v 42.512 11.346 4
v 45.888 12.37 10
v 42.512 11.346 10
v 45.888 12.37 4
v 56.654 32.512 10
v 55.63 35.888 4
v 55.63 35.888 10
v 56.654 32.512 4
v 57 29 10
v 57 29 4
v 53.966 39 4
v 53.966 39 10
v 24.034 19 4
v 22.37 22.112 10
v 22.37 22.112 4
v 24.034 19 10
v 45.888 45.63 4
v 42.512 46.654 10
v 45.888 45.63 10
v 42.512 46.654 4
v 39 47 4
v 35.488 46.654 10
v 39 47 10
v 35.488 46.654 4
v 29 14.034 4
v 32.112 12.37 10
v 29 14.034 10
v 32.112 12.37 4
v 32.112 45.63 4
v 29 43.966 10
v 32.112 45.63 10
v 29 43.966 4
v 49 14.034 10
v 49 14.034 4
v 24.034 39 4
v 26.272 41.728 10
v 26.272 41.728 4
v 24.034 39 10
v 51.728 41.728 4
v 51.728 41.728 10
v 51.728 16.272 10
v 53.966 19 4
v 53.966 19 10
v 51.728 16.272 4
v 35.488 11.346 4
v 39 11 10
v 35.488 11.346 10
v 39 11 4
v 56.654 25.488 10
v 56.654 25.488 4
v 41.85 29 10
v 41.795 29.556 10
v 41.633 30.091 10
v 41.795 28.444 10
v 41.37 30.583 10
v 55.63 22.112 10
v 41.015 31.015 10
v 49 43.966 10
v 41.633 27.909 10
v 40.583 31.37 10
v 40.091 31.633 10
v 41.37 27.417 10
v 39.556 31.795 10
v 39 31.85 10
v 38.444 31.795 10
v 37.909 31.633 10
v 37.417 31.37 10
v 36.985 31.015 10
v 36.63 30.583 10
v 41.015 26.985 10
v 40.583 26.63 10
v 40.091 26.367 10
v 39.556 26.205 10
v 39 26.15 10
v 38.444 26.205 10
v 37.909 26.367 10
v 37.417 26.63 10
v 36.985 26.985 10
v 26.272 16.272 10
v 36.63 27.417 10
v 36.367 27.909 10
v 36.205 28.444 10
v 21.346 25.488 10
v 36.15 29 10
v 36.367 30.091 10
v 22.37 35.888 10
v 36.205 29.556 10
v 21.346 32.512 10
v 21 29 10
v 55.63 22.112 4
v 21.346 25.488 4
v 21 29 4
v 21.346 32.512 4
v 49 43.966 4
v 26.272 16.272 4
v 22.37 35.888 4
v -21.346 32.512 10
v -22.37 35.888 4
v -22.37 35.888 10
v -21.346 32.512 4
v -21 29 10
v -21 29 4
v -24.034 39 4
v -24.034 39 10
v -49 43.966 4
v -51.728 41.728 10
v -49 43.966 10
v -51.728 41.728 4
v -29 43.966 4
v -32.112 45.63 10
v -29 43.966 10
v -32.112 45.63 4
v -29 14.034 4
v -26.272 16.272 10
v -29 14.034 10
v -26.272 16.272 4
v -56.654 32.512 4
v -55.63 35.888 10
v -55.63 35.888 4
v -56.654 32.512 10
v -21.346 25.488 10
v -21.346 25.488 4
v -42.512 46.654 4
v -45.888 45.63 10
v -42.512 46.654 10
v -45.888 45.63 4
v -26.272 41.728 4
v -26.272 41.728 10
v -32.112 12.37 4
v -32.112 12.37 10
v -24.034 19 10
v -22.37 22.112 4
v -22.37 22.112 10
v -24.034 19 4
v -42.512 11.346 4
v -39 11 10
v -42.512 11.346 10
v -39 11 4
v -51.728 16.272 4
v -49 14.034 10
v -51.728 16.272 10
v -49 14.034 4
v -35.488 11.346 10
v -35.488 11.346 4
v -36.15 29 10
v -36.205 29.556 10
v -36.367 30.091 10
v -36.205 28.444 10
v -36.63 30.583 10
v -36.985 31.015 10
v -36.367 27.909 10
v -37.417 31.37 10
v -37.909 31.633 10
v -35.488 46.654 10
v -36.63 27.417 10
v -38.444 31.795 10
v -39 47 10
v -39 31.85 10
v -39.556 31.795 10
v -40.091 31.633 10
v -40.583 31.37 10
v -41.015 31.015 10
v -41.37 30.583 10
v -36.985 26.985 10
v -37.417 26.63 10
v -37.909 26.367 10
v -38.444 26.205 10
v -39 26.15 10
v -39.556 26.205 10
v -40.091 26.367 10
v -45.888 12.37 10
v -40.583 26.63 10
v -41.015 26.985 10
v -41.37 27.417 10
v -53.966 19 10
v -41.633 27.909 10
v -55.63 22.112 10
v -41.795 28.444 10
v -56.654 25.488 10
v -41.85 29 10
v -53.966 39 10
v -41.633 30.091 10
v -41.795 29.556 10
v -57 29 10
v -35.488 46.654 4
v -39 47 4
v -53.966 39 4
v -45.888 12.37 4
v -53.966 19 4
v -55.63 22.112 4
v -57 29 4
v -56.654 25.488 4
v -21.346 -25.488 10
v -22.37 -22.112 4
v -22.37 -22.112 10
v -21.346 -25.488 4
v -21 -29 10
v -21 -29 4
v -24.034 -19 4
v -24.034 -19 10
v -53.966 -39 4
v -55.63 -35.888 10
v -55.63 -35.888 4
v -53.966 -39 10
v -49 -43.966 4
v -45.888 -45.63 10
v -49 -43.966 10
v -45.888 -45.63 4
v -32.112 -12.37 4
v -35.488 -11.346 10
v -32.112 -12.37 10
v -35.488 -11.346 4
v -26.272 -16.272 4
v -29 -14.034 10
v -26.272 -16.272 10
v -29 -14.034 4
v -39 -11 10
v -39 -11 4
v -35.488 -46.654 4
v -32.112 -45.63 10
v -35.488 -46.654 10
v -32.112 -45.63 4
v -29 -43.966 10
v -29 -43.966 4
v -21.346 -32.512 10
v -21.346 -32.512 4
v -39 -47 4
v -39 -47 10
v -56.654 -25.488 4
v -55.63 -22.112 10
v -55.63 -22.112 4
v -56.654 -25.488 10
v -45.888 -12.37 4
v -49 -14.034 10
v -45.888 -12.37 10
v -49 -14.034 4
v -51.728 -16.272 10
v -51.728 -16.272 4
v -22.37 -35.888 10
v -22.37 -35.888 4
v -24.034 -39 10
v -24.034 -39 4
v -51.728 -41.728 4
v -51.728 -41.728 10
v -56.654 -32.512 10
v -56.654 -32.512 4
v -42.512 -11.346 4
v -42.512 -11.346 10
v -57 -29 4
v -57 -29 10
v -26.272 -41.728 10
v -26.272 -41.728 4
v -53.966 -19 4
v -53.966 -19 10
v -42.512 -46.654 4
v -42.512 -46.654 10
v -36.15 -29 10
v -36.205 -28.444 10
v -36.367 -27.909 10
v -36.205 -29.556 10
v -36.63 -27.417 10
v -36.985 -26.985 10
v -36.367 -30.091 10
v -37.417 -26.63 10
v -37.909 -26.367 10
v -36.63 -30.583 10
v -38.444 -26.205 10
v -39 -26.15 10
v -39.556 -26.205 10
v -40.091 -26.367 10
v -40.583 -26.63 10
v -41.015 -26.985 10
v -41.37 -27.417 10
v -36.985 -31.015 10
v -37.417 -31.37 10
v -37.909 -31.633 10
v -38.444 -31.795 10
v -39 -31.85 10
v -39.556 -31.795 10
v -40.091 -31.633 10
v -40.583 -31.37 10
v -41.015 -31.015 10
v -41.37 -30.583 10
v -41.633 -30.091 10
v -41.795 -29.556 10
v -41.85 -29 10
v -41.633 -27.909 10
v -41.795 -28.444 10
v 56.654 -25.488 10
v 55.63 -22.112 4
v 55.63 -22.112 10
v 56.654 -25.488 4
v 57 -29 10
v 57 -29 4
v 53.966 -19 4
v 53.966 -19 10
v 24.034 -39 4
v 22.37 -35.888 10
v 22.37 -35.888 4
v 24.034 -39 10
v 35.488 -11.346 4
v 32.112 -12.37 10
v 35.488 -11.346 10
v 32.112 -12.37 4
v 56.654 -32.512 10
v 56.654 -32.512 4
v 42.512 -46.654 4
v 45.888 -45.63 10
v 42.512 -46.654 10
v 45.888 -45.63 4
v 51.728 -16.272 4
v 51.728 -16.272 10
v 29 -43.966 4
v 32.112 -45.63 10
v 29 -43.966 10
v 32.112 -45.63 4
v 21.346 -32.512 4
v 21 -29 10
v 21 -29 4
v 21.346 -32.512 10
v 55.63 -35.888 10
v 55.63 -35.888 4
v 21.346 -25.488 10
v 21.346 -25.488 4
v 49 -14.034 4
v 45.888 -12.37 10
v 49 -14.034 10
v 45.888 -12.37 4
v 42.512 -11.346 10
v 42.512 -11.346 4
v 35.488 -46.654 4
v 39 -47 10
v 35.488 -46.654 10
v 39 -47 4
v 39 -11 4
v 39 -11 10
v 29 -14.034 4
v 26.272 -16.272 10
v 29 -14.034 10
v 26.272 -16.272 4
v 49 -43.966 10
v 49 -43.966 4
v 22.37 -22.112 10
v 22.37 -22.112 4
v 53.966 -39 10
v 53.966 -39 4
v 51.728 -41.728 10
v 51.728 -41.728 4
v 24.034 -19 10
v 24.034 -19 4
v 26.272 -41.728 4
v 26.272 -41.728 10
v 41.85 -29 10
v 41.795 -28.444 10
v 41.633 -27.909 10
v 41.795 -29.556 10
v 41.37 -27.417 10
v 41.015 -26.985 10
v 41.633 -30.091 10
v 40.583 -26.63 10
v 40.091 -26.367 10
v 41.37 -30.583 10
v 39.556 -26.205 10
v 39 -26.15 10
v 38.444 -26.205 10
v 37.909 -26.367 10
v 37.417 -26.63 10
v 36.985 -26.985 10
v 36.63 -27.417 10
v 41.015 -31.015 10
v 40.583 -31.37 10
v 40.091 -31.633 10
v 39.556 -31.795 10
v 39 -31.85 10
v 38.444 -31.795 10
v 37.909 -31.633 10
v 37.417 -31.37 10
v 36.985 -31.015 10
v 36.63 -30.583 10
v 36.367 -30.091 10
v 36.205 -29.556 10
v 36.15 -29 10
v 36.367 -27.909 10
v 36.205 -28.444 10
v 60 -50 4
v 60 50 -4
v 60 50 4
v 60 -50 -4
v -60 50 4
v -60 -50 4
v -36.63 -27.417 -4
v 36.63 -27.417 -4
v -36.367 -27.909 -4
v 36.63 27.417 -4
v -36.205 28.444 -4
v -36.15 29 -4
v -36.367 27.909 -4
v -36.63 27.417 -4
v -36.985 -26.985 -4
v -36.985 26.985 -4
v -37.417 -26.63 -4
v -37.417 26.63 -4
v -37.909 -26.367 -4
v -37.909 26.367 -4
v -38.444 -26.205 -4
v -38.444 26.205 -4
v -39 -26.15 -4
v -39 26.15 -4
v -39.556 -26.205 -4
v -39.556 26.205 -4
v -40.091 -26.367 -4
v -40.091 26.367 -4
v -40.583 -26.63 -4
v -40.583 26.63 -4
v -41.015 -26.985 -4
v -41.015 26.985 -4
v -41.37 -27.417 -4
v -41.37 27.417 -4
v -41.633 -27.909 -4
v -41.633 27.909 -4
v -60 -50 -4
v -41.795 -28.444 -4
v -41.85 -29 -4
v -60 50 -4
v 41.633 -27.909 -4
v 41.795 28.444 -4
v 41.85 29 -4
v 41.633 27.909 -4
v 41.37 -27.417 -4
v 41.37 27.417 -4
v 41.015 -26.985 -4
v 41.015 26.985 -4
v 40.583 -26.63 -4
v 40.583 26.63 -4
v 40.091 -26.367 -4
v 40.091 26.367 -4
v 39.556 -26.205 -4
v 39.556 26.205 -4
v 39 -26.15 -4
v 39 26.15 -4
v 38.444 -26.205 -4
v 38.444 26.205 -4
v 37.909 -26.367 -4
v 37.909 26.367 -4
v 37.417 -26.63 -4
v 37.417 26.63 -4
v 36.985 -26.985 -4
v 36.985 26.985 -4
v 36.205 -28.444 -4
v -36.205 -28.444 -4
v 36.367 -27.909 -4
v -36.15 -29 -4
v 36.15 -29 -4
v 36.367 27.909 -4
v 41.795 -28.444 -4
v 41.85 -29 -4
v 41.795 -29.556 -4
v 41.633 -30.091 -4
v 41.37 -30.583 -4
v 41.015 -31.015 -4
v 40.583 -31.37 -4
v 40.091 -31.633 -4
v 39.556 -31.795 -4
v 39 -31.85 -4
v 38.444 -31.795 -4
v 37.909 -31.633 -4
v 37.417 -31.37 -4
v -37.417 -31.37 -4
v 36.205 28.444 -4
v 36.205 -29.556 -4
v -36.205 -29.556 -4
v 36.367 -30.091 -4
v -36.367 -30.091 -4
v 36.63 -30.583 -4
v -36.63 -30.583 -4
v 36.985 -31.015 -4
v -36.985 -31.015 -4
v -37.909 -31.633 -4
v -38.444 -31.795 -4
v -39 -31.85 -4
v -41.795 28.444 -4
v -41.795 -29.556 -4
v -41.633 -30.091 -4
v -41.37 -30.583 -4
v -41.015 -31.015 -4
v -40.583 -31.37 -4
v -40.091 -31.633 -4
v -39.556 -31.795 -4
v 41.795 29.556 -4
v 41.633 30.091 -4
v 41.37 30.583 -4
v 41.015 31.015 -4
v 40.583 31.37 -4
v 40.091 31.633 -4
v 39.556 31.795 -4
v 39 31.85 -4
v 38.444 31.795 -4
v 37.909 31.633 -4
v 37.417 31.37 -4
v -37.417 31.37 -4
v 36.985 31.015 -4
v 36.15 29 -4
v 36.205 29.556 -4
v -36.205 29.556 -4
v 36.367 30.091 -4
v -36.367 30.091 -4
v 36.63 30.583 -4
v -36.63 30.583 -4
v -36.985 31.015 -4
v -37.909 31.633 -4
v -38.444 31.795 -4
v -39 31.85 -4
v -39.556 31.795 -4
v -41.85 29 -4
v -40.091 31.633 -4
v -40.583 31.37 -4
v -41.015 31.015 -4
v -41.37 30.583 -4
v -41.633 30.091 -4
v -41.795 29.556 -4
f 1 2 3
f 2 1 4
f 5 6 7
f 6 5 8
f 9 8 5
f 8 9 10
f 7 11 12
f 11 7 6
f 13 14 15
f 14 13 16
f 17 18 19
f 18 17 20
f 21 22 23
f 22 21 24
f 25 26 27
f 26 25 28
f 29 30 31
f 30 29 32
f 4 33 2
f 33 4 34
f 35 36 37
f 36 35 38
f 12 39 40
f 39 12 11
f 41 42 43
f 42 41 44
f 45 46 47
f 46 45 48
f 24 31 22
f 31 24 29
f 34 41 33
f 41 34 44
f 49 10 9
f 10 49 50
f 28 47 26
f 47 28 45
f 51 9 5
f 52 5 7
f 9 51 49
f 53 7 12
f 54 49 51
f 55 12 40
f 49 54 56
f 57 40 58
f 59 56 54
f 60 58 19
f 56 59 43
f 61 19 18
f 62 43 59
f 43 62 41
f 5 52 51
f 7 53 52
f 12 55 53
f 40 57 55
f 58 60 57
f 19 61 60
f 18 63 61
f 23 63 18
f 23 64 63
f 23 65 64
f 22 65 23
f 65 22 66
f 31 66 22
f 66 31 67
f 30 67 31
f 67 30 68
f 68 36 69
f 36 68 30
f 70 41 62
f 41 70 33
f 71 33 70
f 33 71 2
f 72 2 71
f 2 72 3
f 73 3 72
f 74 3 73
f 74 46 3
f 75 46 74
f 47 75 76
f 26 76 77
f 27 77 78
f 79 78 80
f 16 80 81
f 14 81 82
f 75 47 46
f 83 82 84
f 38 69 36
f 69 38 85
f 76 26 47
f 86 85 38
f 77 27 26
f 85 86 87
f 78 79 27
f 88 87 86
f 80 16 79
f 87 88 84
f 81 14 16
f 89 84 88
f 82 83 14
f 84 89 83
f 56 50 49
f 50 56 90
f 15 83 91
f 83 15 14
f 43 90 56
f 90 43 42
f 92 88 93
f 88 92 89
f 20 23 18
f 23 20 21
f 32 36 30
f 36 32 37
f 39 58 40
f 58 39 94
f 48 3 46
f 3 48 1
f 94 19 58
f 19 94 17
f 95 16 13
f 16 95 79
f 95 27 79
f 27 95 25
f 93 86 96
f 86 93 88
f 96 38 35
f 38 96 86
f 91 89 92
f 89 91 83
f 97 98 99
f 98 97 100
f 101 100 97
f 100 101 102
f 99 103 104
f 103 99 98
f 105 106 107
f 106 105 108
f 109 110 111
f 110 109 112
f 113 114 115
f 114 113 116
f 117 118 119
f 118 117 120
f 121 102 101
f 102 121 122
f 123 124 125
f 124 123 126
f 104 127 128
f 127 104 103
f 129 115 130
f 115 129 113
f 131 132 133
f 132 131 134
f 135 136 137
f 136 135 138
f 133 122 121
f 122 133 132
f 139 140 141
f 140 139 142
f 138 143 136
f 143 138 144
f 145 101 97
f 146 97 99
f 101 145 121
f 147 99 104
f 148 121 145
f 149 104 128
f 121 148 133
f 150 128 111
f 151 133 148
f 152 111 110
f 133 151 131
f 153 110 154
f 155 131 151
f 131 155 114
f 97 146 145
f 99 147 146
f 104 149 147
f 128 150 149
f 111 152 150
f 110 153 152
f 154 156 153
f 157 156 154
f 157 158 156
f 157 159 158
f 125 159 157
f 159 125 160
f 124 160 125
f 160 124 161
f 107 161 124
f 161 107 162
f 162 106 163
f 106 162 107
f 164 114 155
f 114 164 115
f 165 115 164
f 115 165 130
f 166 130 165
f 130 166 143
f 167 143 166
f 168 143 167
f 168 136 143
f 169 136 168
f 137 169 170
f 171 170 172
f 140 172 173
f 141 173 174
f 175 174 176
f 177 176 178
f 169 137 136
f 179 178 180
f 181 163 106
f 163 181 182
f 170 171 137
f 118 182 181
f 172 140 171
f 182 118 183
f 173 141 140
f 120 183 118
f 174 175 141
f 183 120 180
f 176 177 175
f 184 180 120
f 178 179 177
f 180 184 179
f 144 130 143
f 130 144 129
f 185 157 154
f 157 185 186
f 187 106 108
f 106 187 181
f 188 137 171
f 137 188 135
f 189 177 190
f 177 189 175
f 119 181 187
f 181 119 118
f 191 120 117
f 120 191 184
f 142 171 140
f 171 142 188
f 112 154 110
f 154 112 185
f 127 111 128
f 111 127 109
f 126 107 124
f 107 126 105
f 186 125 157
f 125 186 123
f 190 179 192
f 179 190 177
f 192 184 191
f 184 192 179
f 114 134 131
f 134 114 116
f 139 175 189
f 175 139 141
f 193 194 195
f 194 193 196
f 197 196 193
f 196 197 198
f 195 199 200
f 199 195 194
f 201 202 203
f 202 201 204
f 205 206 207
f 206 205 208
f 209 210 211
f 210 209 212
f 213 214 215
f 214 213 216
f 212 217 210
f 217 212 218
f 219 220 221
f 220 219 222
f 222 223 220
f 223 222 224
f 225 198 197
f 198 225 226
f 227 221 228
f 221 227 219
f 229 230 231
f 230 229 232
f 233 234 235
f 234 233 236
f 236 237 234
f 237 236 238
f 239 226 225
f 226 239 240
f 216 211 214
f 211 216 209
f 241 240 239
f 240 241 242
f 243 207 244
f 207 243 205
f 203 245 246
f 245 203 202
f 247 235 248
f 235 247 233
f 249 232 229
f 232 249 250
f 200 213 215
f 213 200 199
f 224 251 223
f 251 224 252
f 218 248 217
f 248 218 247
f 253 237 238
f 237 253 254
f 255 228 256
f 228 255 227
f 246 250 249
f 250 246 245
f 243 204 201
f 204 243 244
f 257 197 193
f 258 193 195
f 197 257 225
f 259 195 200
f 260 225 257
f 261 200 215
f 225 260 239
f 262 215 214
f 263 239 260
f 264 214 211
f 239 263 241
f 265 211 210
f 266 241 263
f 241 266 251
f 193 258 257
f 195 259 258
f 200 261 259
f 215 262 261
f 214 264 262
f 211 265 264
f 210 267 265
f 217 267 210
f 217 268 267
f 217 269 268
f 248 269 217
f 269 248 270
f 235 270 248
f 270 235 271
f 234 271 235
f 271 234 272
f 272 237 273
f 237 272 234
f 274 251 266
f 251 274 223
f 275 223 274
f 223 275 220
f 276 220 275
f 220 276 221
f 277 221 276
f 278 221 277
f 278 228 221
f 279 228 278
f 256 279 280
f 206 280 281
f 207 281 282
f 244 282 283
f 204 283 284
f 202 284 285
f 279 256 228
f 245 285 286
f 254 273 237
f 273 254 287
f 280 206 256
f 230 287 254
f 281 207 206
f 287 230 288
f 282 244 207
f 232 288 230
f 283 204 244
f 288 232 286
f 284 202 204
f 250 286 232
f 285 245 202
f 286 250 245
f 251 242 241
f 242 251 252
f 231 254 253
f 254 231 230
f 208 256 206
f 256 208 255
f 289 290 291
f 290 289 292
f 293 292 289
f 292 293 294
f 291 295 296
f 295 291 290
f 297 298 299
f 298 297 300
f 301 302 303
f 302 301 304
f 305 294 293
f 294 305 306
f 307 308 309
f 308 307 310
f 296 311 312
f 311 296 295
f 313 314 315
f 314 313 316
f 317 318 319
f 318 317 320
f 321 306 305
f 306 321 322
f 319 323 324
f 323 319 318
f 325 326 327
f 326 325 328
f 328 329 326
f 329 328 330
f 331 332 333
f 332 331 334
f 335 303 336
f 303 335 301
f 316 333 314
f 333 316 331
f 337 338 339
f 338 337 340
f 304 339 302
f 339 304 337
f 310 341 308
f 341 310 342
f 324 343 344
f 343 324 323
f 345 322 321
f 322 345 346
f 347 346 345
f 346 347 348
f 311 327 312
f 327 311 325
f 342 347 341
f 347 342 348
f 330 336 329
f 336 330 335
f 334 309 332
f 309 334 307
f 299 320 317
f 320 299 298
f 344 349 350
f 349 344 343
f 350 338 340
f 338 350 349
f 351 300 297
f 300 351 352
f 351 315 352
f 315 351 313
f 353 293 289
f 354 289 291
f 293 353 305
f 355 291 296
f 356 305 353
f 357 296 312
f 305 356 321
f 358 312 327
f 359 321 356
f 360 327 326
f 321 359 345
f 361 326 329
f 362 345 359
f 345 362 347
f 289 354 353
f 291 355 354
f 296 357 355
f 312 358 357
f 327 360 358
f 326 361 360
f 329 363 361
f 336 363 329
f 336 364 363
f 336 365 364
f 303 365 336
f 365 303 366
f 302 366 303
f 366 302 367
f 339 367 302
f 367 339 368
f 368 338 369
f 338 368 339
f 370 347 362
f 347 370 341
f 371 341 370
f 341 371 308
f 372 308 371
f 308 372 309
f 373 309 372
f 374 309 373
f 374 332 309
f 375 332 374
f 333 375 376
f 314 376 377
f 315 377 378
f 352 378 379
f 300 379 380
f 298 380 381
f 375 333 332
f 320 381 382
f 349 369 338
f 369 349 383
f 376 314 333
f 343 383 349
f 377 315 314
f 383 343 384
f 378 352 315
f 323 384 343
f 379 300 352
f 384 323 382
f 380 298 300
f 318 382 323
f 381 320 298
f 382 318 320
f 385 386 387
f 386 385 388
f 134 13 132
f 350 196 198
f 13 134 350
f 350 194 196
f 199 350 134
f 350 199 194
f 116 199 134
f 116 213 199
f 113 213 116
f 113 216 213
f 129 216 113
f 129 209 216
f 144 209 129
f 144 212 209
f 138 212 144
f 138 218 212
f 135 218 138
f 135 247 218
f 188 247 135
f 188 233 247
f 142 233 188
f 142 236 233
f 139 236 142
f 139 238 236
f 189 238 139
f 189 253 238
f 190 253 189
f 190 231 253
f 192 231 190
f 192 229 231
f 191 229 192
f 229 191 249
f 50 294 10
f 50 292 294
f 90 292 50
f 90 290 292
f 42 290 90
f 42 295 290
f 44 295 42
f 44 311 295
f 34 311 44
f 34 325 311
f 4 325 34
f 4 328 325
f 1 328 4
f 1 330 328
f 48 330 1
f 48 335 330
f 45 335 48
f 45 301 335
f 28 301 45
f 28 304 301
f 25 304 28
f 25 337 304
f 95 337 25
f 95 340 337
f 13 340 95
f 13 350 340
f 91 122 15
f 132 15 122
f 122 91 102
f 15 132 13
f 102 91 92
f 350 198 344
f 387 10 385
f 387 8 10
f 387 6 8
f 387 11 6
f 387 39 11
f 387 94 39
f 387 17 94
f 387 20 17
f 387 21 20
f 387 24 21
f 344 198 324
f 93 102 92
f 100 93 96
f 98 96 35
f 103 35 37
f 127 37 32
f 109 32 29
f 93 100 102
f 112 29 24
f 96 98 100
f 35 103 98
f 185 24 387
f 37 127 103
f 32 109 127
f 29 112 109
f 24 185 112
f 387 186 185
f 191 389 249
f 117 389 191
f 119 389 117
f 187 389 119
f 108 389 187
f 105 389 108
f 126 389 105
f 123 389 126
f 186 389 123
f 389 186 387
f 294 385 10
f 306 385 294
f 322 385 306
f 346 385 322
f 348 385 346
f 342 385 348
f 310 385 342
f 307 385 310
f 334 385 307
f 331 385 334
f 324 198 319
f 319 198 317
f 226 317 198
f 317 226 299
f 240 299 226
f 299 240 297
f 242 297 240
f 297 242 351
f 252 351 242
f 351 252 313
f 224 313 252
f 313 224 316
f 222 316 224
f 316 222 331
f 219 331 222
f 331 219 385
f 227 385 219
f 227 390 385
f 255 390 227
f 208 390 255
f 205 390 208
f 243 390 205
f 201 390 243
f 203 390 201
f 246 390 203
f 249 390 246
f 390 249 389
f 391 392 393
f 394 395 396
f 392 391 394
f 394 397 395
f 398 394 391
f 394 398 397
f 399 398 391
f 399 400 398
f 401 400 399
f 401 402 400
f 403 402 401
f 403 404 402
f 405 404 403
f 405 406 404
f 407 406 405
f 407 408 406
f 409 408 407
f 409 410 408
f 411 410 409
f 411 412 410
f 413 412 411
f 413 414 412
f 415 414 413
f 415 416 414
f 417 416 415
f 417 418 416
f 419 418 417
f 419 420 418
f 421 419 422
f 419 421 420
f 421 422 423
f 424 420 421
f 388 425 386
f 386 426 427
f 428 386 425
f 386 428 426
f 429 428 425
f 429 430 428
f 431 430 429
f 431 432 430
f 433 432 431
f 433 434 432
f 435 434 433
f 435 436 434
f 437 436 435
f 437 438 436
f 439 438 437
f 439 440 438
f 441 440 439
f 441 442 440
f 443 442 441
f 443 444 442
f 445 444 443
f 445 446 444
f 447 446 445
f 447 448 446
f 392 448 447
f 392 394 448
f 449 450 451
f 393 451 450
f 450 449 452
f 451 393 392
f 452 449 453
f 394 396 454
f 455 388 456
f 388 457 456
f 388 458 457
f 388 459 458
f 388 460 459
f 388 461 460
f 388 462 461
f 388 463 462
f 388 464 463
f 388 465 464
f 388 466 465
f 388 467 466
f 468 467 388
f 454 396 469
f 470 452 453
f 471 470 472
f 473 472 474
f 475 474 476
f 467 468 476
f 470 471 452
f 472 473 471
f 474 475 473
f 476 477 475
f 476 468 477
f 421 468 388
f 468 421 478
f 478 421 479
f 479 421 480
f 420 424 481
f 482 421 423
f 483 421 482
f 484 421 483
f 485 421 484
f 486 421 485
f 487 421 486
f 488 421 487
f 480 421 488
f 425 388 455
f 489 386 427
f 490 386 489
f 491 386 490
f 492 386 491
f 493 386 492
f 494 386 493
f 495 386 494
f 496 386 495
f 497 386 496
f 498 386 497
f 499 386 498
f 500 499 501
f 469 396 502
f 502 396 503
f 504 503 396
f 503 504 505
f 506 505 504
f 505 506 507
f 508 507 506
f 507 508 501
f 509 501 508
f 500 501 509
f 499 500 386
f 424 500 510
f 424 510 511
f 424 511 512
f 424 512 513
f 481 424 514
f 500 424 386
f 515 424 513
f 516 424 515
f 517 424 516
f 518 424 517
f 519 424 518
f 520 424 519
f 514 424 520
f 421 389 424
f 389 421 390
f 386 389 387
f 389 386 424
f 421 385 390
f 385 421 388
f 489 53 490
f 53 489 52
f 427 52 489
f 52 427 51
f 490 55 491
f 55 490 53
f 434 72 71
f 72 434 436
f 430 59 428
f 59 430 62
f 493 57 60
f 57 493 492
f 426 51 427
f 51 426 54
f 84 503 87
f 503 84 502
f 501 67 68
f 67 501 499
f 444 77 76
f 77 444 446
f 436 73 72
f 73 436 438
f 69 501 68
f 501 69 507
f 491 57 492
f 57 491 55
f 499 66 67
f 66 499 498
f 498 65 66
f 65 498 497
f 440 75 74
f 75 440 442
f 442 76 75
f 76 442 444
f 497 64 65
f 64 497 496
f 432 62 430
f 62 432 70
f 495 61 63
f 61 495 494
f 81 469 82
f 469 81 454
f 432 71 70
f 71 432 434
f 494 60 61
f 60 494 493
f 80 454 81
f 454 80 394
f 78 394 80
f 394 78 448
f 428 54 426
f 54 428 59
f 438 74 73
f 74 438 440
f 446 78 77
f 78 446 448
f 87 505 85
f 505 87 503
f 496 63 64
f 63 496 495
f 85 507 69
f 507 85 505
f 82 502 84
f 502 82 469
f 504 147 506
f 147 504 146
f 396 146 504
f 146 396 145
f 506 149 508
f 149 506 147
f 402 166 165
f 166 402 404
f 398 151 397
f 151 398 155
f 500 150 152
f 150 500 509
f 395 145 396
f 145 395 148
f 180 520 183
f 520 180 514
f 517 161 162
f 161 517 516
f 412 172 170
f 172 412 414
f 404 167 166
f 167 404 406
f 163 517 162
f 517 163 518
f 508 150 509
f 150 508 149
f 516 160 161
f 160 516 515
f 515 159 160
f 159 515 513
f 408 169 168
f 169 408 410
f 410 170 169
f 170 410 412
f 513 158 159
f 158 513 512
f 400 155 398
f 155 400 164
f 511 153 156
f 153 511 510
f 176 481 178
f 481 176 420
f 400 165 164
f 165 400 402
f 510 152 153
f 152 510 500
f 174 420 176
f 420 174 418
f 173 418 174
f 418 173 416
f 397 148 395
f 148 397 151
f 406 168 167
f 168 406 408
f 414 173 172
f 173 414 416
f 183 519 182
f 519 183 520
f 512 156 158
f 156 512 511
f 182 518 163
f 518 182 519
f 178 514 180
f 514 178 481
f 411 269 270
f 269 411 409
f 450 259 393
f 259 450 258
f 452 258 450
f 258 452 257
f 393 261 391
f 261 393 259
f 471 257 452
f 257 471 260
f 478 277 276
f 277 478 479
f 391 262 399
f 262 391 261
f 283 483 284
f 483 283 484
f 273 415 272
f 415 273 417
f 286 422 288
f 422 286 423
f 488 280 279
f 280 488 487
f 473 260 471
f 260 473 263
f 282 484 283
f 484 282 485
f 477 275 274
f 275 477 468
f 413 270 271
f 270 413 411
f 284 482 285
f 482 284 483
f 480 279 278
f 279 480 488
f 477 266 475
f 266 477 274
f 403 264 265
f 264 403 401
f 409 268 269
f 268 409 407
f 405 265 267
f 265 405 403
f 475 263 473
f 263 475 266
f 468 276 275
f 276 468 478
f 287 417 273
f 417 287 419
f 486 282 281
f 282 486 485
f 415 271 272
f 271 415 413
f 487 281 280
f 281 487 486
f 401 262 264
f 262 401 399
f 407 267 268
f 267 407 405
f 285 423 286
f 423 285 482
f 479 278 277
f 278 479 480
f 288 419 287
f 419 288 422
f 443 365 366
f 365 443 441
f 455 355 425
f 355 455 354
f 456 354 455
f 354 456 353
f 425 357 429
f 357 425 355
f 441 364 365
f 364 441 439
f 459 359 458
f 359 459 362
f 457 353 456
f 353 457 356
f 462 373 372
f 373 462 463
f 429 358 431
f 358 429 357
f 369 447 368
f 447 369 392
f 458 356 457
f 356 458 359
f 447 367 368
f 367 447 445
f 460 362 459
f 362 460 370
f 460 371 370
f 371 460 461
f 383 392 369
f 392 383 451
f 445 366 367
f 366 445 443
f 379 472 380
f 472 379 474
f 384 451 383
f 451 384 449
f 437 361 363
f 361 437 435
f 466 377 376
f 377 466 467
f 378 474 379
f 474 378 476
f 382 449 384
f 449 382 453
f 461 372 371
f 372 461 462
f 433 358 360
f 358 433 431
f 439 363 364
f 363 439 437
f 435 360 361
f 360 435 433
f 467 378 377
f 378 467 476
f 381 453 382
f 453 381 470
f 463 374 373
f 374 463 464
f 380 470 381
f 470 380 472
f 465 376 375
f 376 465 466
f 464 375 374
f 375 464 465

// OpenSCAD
$fn = 32;

// ----------------------------------------------------------------------
// Anchor pads 120 x 100 x 14
// four corner bosses with anchor holes
// ----------------------------------------------------------------------

// --- parameters (mm) ---
plate = [120, 100, 8];  // base plate size (x, y, z)
pads = 4;               // boss count, one per corner
edge = 21;              // boss centre offset from the plate edge
boss_d = 36;            // boss diameter
boss_h = 6;             // boss height above the base plate
bore_d = 5.5;           // nominal hole diameter from the drawing
print_allowance = 0.2;  // clearance added for printing

// --- derived feature positions (mm) ---
hole_d = bore_d + print_allowance;  // = 5.7   hole diameter as printed
height = plate[2] + boss_h;         // = 14   overall height of the part
corner_x = plate[0] / 2 - edge;     // = 39   boss centre X
corner_y = plate[1] / 2 - edge;     // = 29   boss centre Y
feature_centers = [
  [corner_x, corner_y],
  [-corner_x, corner_y],
  [-corner_x, -corner_y],
  [corner_x, -corner_y]
];   // boss centres, anchor holes are drilled there

// base plate, four bosses standing on it, anchor holes all the way through
difference() {
  union() {
    cube(plate, center = true);
    for (centre = feature_centers)
      translate([centre[0], centre[1], plate[2] / 2 - 1])
        cylinder(d = boss_d, h = boss_h + 1);
  }
  for (centre = feature_centers)
    translate([centre[0], centre[1], -height])
      cylinder(d = hole_d, h = 2 * height + 2);  // through boss and plate
}
